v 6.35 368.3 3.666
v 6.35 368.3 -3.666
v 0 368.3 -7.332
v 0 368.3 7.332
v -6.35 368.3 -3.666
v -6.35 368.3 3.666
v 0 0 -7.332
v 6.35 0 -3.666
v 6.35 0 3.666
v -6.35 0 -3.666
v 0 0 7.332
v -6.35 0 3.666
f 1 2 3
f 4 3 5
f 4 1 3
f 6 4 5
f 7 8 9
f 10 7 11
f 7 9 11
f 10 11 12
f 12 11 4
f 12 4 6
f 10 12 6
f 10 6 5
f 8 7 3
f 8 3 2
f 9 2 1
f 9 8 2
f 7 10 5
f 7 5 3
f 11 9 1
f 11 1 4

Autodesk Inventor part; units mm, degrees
ref_plane "YZ Plane" through (0, 0, 0) normal (1, 0, 0) x (0, 1, 0)
ref_plane "XZ Plane" through (0, 0, 0) normal (0, 1, 0) x (-1, 0, 0)
ref_plane "XY Plane" through (0, 0, 0) normal (0, 0, 1) x (1, 0, 0)
sketch "Sketch1" plane through (0, 0, 0) normal (0, 1, 0) x (-1, 0, 0)
  line L0 (0, -7.3323) -> (-6.35, -3.6662)
  line L1 (-6.35, -3.6662) -> (-6.35, 3.6662)
  line L2 (-6.35, 3.6662) -> (0, 7.3323)
  line L3 (0, 7.3323) -> (6.35, 3.6662)
  line L4 (6.35, 3.6662) -> (6.35, -3.6662)
  line L5 (6.35, -3.6662) -> (0, -7.3323)
  point P0 (0, 0)
  point P1 (0, 0)
  dimension "d0" = 12.7
extrude "Extrusion1" add sketch "Sketch1" along normal blind 368.3
